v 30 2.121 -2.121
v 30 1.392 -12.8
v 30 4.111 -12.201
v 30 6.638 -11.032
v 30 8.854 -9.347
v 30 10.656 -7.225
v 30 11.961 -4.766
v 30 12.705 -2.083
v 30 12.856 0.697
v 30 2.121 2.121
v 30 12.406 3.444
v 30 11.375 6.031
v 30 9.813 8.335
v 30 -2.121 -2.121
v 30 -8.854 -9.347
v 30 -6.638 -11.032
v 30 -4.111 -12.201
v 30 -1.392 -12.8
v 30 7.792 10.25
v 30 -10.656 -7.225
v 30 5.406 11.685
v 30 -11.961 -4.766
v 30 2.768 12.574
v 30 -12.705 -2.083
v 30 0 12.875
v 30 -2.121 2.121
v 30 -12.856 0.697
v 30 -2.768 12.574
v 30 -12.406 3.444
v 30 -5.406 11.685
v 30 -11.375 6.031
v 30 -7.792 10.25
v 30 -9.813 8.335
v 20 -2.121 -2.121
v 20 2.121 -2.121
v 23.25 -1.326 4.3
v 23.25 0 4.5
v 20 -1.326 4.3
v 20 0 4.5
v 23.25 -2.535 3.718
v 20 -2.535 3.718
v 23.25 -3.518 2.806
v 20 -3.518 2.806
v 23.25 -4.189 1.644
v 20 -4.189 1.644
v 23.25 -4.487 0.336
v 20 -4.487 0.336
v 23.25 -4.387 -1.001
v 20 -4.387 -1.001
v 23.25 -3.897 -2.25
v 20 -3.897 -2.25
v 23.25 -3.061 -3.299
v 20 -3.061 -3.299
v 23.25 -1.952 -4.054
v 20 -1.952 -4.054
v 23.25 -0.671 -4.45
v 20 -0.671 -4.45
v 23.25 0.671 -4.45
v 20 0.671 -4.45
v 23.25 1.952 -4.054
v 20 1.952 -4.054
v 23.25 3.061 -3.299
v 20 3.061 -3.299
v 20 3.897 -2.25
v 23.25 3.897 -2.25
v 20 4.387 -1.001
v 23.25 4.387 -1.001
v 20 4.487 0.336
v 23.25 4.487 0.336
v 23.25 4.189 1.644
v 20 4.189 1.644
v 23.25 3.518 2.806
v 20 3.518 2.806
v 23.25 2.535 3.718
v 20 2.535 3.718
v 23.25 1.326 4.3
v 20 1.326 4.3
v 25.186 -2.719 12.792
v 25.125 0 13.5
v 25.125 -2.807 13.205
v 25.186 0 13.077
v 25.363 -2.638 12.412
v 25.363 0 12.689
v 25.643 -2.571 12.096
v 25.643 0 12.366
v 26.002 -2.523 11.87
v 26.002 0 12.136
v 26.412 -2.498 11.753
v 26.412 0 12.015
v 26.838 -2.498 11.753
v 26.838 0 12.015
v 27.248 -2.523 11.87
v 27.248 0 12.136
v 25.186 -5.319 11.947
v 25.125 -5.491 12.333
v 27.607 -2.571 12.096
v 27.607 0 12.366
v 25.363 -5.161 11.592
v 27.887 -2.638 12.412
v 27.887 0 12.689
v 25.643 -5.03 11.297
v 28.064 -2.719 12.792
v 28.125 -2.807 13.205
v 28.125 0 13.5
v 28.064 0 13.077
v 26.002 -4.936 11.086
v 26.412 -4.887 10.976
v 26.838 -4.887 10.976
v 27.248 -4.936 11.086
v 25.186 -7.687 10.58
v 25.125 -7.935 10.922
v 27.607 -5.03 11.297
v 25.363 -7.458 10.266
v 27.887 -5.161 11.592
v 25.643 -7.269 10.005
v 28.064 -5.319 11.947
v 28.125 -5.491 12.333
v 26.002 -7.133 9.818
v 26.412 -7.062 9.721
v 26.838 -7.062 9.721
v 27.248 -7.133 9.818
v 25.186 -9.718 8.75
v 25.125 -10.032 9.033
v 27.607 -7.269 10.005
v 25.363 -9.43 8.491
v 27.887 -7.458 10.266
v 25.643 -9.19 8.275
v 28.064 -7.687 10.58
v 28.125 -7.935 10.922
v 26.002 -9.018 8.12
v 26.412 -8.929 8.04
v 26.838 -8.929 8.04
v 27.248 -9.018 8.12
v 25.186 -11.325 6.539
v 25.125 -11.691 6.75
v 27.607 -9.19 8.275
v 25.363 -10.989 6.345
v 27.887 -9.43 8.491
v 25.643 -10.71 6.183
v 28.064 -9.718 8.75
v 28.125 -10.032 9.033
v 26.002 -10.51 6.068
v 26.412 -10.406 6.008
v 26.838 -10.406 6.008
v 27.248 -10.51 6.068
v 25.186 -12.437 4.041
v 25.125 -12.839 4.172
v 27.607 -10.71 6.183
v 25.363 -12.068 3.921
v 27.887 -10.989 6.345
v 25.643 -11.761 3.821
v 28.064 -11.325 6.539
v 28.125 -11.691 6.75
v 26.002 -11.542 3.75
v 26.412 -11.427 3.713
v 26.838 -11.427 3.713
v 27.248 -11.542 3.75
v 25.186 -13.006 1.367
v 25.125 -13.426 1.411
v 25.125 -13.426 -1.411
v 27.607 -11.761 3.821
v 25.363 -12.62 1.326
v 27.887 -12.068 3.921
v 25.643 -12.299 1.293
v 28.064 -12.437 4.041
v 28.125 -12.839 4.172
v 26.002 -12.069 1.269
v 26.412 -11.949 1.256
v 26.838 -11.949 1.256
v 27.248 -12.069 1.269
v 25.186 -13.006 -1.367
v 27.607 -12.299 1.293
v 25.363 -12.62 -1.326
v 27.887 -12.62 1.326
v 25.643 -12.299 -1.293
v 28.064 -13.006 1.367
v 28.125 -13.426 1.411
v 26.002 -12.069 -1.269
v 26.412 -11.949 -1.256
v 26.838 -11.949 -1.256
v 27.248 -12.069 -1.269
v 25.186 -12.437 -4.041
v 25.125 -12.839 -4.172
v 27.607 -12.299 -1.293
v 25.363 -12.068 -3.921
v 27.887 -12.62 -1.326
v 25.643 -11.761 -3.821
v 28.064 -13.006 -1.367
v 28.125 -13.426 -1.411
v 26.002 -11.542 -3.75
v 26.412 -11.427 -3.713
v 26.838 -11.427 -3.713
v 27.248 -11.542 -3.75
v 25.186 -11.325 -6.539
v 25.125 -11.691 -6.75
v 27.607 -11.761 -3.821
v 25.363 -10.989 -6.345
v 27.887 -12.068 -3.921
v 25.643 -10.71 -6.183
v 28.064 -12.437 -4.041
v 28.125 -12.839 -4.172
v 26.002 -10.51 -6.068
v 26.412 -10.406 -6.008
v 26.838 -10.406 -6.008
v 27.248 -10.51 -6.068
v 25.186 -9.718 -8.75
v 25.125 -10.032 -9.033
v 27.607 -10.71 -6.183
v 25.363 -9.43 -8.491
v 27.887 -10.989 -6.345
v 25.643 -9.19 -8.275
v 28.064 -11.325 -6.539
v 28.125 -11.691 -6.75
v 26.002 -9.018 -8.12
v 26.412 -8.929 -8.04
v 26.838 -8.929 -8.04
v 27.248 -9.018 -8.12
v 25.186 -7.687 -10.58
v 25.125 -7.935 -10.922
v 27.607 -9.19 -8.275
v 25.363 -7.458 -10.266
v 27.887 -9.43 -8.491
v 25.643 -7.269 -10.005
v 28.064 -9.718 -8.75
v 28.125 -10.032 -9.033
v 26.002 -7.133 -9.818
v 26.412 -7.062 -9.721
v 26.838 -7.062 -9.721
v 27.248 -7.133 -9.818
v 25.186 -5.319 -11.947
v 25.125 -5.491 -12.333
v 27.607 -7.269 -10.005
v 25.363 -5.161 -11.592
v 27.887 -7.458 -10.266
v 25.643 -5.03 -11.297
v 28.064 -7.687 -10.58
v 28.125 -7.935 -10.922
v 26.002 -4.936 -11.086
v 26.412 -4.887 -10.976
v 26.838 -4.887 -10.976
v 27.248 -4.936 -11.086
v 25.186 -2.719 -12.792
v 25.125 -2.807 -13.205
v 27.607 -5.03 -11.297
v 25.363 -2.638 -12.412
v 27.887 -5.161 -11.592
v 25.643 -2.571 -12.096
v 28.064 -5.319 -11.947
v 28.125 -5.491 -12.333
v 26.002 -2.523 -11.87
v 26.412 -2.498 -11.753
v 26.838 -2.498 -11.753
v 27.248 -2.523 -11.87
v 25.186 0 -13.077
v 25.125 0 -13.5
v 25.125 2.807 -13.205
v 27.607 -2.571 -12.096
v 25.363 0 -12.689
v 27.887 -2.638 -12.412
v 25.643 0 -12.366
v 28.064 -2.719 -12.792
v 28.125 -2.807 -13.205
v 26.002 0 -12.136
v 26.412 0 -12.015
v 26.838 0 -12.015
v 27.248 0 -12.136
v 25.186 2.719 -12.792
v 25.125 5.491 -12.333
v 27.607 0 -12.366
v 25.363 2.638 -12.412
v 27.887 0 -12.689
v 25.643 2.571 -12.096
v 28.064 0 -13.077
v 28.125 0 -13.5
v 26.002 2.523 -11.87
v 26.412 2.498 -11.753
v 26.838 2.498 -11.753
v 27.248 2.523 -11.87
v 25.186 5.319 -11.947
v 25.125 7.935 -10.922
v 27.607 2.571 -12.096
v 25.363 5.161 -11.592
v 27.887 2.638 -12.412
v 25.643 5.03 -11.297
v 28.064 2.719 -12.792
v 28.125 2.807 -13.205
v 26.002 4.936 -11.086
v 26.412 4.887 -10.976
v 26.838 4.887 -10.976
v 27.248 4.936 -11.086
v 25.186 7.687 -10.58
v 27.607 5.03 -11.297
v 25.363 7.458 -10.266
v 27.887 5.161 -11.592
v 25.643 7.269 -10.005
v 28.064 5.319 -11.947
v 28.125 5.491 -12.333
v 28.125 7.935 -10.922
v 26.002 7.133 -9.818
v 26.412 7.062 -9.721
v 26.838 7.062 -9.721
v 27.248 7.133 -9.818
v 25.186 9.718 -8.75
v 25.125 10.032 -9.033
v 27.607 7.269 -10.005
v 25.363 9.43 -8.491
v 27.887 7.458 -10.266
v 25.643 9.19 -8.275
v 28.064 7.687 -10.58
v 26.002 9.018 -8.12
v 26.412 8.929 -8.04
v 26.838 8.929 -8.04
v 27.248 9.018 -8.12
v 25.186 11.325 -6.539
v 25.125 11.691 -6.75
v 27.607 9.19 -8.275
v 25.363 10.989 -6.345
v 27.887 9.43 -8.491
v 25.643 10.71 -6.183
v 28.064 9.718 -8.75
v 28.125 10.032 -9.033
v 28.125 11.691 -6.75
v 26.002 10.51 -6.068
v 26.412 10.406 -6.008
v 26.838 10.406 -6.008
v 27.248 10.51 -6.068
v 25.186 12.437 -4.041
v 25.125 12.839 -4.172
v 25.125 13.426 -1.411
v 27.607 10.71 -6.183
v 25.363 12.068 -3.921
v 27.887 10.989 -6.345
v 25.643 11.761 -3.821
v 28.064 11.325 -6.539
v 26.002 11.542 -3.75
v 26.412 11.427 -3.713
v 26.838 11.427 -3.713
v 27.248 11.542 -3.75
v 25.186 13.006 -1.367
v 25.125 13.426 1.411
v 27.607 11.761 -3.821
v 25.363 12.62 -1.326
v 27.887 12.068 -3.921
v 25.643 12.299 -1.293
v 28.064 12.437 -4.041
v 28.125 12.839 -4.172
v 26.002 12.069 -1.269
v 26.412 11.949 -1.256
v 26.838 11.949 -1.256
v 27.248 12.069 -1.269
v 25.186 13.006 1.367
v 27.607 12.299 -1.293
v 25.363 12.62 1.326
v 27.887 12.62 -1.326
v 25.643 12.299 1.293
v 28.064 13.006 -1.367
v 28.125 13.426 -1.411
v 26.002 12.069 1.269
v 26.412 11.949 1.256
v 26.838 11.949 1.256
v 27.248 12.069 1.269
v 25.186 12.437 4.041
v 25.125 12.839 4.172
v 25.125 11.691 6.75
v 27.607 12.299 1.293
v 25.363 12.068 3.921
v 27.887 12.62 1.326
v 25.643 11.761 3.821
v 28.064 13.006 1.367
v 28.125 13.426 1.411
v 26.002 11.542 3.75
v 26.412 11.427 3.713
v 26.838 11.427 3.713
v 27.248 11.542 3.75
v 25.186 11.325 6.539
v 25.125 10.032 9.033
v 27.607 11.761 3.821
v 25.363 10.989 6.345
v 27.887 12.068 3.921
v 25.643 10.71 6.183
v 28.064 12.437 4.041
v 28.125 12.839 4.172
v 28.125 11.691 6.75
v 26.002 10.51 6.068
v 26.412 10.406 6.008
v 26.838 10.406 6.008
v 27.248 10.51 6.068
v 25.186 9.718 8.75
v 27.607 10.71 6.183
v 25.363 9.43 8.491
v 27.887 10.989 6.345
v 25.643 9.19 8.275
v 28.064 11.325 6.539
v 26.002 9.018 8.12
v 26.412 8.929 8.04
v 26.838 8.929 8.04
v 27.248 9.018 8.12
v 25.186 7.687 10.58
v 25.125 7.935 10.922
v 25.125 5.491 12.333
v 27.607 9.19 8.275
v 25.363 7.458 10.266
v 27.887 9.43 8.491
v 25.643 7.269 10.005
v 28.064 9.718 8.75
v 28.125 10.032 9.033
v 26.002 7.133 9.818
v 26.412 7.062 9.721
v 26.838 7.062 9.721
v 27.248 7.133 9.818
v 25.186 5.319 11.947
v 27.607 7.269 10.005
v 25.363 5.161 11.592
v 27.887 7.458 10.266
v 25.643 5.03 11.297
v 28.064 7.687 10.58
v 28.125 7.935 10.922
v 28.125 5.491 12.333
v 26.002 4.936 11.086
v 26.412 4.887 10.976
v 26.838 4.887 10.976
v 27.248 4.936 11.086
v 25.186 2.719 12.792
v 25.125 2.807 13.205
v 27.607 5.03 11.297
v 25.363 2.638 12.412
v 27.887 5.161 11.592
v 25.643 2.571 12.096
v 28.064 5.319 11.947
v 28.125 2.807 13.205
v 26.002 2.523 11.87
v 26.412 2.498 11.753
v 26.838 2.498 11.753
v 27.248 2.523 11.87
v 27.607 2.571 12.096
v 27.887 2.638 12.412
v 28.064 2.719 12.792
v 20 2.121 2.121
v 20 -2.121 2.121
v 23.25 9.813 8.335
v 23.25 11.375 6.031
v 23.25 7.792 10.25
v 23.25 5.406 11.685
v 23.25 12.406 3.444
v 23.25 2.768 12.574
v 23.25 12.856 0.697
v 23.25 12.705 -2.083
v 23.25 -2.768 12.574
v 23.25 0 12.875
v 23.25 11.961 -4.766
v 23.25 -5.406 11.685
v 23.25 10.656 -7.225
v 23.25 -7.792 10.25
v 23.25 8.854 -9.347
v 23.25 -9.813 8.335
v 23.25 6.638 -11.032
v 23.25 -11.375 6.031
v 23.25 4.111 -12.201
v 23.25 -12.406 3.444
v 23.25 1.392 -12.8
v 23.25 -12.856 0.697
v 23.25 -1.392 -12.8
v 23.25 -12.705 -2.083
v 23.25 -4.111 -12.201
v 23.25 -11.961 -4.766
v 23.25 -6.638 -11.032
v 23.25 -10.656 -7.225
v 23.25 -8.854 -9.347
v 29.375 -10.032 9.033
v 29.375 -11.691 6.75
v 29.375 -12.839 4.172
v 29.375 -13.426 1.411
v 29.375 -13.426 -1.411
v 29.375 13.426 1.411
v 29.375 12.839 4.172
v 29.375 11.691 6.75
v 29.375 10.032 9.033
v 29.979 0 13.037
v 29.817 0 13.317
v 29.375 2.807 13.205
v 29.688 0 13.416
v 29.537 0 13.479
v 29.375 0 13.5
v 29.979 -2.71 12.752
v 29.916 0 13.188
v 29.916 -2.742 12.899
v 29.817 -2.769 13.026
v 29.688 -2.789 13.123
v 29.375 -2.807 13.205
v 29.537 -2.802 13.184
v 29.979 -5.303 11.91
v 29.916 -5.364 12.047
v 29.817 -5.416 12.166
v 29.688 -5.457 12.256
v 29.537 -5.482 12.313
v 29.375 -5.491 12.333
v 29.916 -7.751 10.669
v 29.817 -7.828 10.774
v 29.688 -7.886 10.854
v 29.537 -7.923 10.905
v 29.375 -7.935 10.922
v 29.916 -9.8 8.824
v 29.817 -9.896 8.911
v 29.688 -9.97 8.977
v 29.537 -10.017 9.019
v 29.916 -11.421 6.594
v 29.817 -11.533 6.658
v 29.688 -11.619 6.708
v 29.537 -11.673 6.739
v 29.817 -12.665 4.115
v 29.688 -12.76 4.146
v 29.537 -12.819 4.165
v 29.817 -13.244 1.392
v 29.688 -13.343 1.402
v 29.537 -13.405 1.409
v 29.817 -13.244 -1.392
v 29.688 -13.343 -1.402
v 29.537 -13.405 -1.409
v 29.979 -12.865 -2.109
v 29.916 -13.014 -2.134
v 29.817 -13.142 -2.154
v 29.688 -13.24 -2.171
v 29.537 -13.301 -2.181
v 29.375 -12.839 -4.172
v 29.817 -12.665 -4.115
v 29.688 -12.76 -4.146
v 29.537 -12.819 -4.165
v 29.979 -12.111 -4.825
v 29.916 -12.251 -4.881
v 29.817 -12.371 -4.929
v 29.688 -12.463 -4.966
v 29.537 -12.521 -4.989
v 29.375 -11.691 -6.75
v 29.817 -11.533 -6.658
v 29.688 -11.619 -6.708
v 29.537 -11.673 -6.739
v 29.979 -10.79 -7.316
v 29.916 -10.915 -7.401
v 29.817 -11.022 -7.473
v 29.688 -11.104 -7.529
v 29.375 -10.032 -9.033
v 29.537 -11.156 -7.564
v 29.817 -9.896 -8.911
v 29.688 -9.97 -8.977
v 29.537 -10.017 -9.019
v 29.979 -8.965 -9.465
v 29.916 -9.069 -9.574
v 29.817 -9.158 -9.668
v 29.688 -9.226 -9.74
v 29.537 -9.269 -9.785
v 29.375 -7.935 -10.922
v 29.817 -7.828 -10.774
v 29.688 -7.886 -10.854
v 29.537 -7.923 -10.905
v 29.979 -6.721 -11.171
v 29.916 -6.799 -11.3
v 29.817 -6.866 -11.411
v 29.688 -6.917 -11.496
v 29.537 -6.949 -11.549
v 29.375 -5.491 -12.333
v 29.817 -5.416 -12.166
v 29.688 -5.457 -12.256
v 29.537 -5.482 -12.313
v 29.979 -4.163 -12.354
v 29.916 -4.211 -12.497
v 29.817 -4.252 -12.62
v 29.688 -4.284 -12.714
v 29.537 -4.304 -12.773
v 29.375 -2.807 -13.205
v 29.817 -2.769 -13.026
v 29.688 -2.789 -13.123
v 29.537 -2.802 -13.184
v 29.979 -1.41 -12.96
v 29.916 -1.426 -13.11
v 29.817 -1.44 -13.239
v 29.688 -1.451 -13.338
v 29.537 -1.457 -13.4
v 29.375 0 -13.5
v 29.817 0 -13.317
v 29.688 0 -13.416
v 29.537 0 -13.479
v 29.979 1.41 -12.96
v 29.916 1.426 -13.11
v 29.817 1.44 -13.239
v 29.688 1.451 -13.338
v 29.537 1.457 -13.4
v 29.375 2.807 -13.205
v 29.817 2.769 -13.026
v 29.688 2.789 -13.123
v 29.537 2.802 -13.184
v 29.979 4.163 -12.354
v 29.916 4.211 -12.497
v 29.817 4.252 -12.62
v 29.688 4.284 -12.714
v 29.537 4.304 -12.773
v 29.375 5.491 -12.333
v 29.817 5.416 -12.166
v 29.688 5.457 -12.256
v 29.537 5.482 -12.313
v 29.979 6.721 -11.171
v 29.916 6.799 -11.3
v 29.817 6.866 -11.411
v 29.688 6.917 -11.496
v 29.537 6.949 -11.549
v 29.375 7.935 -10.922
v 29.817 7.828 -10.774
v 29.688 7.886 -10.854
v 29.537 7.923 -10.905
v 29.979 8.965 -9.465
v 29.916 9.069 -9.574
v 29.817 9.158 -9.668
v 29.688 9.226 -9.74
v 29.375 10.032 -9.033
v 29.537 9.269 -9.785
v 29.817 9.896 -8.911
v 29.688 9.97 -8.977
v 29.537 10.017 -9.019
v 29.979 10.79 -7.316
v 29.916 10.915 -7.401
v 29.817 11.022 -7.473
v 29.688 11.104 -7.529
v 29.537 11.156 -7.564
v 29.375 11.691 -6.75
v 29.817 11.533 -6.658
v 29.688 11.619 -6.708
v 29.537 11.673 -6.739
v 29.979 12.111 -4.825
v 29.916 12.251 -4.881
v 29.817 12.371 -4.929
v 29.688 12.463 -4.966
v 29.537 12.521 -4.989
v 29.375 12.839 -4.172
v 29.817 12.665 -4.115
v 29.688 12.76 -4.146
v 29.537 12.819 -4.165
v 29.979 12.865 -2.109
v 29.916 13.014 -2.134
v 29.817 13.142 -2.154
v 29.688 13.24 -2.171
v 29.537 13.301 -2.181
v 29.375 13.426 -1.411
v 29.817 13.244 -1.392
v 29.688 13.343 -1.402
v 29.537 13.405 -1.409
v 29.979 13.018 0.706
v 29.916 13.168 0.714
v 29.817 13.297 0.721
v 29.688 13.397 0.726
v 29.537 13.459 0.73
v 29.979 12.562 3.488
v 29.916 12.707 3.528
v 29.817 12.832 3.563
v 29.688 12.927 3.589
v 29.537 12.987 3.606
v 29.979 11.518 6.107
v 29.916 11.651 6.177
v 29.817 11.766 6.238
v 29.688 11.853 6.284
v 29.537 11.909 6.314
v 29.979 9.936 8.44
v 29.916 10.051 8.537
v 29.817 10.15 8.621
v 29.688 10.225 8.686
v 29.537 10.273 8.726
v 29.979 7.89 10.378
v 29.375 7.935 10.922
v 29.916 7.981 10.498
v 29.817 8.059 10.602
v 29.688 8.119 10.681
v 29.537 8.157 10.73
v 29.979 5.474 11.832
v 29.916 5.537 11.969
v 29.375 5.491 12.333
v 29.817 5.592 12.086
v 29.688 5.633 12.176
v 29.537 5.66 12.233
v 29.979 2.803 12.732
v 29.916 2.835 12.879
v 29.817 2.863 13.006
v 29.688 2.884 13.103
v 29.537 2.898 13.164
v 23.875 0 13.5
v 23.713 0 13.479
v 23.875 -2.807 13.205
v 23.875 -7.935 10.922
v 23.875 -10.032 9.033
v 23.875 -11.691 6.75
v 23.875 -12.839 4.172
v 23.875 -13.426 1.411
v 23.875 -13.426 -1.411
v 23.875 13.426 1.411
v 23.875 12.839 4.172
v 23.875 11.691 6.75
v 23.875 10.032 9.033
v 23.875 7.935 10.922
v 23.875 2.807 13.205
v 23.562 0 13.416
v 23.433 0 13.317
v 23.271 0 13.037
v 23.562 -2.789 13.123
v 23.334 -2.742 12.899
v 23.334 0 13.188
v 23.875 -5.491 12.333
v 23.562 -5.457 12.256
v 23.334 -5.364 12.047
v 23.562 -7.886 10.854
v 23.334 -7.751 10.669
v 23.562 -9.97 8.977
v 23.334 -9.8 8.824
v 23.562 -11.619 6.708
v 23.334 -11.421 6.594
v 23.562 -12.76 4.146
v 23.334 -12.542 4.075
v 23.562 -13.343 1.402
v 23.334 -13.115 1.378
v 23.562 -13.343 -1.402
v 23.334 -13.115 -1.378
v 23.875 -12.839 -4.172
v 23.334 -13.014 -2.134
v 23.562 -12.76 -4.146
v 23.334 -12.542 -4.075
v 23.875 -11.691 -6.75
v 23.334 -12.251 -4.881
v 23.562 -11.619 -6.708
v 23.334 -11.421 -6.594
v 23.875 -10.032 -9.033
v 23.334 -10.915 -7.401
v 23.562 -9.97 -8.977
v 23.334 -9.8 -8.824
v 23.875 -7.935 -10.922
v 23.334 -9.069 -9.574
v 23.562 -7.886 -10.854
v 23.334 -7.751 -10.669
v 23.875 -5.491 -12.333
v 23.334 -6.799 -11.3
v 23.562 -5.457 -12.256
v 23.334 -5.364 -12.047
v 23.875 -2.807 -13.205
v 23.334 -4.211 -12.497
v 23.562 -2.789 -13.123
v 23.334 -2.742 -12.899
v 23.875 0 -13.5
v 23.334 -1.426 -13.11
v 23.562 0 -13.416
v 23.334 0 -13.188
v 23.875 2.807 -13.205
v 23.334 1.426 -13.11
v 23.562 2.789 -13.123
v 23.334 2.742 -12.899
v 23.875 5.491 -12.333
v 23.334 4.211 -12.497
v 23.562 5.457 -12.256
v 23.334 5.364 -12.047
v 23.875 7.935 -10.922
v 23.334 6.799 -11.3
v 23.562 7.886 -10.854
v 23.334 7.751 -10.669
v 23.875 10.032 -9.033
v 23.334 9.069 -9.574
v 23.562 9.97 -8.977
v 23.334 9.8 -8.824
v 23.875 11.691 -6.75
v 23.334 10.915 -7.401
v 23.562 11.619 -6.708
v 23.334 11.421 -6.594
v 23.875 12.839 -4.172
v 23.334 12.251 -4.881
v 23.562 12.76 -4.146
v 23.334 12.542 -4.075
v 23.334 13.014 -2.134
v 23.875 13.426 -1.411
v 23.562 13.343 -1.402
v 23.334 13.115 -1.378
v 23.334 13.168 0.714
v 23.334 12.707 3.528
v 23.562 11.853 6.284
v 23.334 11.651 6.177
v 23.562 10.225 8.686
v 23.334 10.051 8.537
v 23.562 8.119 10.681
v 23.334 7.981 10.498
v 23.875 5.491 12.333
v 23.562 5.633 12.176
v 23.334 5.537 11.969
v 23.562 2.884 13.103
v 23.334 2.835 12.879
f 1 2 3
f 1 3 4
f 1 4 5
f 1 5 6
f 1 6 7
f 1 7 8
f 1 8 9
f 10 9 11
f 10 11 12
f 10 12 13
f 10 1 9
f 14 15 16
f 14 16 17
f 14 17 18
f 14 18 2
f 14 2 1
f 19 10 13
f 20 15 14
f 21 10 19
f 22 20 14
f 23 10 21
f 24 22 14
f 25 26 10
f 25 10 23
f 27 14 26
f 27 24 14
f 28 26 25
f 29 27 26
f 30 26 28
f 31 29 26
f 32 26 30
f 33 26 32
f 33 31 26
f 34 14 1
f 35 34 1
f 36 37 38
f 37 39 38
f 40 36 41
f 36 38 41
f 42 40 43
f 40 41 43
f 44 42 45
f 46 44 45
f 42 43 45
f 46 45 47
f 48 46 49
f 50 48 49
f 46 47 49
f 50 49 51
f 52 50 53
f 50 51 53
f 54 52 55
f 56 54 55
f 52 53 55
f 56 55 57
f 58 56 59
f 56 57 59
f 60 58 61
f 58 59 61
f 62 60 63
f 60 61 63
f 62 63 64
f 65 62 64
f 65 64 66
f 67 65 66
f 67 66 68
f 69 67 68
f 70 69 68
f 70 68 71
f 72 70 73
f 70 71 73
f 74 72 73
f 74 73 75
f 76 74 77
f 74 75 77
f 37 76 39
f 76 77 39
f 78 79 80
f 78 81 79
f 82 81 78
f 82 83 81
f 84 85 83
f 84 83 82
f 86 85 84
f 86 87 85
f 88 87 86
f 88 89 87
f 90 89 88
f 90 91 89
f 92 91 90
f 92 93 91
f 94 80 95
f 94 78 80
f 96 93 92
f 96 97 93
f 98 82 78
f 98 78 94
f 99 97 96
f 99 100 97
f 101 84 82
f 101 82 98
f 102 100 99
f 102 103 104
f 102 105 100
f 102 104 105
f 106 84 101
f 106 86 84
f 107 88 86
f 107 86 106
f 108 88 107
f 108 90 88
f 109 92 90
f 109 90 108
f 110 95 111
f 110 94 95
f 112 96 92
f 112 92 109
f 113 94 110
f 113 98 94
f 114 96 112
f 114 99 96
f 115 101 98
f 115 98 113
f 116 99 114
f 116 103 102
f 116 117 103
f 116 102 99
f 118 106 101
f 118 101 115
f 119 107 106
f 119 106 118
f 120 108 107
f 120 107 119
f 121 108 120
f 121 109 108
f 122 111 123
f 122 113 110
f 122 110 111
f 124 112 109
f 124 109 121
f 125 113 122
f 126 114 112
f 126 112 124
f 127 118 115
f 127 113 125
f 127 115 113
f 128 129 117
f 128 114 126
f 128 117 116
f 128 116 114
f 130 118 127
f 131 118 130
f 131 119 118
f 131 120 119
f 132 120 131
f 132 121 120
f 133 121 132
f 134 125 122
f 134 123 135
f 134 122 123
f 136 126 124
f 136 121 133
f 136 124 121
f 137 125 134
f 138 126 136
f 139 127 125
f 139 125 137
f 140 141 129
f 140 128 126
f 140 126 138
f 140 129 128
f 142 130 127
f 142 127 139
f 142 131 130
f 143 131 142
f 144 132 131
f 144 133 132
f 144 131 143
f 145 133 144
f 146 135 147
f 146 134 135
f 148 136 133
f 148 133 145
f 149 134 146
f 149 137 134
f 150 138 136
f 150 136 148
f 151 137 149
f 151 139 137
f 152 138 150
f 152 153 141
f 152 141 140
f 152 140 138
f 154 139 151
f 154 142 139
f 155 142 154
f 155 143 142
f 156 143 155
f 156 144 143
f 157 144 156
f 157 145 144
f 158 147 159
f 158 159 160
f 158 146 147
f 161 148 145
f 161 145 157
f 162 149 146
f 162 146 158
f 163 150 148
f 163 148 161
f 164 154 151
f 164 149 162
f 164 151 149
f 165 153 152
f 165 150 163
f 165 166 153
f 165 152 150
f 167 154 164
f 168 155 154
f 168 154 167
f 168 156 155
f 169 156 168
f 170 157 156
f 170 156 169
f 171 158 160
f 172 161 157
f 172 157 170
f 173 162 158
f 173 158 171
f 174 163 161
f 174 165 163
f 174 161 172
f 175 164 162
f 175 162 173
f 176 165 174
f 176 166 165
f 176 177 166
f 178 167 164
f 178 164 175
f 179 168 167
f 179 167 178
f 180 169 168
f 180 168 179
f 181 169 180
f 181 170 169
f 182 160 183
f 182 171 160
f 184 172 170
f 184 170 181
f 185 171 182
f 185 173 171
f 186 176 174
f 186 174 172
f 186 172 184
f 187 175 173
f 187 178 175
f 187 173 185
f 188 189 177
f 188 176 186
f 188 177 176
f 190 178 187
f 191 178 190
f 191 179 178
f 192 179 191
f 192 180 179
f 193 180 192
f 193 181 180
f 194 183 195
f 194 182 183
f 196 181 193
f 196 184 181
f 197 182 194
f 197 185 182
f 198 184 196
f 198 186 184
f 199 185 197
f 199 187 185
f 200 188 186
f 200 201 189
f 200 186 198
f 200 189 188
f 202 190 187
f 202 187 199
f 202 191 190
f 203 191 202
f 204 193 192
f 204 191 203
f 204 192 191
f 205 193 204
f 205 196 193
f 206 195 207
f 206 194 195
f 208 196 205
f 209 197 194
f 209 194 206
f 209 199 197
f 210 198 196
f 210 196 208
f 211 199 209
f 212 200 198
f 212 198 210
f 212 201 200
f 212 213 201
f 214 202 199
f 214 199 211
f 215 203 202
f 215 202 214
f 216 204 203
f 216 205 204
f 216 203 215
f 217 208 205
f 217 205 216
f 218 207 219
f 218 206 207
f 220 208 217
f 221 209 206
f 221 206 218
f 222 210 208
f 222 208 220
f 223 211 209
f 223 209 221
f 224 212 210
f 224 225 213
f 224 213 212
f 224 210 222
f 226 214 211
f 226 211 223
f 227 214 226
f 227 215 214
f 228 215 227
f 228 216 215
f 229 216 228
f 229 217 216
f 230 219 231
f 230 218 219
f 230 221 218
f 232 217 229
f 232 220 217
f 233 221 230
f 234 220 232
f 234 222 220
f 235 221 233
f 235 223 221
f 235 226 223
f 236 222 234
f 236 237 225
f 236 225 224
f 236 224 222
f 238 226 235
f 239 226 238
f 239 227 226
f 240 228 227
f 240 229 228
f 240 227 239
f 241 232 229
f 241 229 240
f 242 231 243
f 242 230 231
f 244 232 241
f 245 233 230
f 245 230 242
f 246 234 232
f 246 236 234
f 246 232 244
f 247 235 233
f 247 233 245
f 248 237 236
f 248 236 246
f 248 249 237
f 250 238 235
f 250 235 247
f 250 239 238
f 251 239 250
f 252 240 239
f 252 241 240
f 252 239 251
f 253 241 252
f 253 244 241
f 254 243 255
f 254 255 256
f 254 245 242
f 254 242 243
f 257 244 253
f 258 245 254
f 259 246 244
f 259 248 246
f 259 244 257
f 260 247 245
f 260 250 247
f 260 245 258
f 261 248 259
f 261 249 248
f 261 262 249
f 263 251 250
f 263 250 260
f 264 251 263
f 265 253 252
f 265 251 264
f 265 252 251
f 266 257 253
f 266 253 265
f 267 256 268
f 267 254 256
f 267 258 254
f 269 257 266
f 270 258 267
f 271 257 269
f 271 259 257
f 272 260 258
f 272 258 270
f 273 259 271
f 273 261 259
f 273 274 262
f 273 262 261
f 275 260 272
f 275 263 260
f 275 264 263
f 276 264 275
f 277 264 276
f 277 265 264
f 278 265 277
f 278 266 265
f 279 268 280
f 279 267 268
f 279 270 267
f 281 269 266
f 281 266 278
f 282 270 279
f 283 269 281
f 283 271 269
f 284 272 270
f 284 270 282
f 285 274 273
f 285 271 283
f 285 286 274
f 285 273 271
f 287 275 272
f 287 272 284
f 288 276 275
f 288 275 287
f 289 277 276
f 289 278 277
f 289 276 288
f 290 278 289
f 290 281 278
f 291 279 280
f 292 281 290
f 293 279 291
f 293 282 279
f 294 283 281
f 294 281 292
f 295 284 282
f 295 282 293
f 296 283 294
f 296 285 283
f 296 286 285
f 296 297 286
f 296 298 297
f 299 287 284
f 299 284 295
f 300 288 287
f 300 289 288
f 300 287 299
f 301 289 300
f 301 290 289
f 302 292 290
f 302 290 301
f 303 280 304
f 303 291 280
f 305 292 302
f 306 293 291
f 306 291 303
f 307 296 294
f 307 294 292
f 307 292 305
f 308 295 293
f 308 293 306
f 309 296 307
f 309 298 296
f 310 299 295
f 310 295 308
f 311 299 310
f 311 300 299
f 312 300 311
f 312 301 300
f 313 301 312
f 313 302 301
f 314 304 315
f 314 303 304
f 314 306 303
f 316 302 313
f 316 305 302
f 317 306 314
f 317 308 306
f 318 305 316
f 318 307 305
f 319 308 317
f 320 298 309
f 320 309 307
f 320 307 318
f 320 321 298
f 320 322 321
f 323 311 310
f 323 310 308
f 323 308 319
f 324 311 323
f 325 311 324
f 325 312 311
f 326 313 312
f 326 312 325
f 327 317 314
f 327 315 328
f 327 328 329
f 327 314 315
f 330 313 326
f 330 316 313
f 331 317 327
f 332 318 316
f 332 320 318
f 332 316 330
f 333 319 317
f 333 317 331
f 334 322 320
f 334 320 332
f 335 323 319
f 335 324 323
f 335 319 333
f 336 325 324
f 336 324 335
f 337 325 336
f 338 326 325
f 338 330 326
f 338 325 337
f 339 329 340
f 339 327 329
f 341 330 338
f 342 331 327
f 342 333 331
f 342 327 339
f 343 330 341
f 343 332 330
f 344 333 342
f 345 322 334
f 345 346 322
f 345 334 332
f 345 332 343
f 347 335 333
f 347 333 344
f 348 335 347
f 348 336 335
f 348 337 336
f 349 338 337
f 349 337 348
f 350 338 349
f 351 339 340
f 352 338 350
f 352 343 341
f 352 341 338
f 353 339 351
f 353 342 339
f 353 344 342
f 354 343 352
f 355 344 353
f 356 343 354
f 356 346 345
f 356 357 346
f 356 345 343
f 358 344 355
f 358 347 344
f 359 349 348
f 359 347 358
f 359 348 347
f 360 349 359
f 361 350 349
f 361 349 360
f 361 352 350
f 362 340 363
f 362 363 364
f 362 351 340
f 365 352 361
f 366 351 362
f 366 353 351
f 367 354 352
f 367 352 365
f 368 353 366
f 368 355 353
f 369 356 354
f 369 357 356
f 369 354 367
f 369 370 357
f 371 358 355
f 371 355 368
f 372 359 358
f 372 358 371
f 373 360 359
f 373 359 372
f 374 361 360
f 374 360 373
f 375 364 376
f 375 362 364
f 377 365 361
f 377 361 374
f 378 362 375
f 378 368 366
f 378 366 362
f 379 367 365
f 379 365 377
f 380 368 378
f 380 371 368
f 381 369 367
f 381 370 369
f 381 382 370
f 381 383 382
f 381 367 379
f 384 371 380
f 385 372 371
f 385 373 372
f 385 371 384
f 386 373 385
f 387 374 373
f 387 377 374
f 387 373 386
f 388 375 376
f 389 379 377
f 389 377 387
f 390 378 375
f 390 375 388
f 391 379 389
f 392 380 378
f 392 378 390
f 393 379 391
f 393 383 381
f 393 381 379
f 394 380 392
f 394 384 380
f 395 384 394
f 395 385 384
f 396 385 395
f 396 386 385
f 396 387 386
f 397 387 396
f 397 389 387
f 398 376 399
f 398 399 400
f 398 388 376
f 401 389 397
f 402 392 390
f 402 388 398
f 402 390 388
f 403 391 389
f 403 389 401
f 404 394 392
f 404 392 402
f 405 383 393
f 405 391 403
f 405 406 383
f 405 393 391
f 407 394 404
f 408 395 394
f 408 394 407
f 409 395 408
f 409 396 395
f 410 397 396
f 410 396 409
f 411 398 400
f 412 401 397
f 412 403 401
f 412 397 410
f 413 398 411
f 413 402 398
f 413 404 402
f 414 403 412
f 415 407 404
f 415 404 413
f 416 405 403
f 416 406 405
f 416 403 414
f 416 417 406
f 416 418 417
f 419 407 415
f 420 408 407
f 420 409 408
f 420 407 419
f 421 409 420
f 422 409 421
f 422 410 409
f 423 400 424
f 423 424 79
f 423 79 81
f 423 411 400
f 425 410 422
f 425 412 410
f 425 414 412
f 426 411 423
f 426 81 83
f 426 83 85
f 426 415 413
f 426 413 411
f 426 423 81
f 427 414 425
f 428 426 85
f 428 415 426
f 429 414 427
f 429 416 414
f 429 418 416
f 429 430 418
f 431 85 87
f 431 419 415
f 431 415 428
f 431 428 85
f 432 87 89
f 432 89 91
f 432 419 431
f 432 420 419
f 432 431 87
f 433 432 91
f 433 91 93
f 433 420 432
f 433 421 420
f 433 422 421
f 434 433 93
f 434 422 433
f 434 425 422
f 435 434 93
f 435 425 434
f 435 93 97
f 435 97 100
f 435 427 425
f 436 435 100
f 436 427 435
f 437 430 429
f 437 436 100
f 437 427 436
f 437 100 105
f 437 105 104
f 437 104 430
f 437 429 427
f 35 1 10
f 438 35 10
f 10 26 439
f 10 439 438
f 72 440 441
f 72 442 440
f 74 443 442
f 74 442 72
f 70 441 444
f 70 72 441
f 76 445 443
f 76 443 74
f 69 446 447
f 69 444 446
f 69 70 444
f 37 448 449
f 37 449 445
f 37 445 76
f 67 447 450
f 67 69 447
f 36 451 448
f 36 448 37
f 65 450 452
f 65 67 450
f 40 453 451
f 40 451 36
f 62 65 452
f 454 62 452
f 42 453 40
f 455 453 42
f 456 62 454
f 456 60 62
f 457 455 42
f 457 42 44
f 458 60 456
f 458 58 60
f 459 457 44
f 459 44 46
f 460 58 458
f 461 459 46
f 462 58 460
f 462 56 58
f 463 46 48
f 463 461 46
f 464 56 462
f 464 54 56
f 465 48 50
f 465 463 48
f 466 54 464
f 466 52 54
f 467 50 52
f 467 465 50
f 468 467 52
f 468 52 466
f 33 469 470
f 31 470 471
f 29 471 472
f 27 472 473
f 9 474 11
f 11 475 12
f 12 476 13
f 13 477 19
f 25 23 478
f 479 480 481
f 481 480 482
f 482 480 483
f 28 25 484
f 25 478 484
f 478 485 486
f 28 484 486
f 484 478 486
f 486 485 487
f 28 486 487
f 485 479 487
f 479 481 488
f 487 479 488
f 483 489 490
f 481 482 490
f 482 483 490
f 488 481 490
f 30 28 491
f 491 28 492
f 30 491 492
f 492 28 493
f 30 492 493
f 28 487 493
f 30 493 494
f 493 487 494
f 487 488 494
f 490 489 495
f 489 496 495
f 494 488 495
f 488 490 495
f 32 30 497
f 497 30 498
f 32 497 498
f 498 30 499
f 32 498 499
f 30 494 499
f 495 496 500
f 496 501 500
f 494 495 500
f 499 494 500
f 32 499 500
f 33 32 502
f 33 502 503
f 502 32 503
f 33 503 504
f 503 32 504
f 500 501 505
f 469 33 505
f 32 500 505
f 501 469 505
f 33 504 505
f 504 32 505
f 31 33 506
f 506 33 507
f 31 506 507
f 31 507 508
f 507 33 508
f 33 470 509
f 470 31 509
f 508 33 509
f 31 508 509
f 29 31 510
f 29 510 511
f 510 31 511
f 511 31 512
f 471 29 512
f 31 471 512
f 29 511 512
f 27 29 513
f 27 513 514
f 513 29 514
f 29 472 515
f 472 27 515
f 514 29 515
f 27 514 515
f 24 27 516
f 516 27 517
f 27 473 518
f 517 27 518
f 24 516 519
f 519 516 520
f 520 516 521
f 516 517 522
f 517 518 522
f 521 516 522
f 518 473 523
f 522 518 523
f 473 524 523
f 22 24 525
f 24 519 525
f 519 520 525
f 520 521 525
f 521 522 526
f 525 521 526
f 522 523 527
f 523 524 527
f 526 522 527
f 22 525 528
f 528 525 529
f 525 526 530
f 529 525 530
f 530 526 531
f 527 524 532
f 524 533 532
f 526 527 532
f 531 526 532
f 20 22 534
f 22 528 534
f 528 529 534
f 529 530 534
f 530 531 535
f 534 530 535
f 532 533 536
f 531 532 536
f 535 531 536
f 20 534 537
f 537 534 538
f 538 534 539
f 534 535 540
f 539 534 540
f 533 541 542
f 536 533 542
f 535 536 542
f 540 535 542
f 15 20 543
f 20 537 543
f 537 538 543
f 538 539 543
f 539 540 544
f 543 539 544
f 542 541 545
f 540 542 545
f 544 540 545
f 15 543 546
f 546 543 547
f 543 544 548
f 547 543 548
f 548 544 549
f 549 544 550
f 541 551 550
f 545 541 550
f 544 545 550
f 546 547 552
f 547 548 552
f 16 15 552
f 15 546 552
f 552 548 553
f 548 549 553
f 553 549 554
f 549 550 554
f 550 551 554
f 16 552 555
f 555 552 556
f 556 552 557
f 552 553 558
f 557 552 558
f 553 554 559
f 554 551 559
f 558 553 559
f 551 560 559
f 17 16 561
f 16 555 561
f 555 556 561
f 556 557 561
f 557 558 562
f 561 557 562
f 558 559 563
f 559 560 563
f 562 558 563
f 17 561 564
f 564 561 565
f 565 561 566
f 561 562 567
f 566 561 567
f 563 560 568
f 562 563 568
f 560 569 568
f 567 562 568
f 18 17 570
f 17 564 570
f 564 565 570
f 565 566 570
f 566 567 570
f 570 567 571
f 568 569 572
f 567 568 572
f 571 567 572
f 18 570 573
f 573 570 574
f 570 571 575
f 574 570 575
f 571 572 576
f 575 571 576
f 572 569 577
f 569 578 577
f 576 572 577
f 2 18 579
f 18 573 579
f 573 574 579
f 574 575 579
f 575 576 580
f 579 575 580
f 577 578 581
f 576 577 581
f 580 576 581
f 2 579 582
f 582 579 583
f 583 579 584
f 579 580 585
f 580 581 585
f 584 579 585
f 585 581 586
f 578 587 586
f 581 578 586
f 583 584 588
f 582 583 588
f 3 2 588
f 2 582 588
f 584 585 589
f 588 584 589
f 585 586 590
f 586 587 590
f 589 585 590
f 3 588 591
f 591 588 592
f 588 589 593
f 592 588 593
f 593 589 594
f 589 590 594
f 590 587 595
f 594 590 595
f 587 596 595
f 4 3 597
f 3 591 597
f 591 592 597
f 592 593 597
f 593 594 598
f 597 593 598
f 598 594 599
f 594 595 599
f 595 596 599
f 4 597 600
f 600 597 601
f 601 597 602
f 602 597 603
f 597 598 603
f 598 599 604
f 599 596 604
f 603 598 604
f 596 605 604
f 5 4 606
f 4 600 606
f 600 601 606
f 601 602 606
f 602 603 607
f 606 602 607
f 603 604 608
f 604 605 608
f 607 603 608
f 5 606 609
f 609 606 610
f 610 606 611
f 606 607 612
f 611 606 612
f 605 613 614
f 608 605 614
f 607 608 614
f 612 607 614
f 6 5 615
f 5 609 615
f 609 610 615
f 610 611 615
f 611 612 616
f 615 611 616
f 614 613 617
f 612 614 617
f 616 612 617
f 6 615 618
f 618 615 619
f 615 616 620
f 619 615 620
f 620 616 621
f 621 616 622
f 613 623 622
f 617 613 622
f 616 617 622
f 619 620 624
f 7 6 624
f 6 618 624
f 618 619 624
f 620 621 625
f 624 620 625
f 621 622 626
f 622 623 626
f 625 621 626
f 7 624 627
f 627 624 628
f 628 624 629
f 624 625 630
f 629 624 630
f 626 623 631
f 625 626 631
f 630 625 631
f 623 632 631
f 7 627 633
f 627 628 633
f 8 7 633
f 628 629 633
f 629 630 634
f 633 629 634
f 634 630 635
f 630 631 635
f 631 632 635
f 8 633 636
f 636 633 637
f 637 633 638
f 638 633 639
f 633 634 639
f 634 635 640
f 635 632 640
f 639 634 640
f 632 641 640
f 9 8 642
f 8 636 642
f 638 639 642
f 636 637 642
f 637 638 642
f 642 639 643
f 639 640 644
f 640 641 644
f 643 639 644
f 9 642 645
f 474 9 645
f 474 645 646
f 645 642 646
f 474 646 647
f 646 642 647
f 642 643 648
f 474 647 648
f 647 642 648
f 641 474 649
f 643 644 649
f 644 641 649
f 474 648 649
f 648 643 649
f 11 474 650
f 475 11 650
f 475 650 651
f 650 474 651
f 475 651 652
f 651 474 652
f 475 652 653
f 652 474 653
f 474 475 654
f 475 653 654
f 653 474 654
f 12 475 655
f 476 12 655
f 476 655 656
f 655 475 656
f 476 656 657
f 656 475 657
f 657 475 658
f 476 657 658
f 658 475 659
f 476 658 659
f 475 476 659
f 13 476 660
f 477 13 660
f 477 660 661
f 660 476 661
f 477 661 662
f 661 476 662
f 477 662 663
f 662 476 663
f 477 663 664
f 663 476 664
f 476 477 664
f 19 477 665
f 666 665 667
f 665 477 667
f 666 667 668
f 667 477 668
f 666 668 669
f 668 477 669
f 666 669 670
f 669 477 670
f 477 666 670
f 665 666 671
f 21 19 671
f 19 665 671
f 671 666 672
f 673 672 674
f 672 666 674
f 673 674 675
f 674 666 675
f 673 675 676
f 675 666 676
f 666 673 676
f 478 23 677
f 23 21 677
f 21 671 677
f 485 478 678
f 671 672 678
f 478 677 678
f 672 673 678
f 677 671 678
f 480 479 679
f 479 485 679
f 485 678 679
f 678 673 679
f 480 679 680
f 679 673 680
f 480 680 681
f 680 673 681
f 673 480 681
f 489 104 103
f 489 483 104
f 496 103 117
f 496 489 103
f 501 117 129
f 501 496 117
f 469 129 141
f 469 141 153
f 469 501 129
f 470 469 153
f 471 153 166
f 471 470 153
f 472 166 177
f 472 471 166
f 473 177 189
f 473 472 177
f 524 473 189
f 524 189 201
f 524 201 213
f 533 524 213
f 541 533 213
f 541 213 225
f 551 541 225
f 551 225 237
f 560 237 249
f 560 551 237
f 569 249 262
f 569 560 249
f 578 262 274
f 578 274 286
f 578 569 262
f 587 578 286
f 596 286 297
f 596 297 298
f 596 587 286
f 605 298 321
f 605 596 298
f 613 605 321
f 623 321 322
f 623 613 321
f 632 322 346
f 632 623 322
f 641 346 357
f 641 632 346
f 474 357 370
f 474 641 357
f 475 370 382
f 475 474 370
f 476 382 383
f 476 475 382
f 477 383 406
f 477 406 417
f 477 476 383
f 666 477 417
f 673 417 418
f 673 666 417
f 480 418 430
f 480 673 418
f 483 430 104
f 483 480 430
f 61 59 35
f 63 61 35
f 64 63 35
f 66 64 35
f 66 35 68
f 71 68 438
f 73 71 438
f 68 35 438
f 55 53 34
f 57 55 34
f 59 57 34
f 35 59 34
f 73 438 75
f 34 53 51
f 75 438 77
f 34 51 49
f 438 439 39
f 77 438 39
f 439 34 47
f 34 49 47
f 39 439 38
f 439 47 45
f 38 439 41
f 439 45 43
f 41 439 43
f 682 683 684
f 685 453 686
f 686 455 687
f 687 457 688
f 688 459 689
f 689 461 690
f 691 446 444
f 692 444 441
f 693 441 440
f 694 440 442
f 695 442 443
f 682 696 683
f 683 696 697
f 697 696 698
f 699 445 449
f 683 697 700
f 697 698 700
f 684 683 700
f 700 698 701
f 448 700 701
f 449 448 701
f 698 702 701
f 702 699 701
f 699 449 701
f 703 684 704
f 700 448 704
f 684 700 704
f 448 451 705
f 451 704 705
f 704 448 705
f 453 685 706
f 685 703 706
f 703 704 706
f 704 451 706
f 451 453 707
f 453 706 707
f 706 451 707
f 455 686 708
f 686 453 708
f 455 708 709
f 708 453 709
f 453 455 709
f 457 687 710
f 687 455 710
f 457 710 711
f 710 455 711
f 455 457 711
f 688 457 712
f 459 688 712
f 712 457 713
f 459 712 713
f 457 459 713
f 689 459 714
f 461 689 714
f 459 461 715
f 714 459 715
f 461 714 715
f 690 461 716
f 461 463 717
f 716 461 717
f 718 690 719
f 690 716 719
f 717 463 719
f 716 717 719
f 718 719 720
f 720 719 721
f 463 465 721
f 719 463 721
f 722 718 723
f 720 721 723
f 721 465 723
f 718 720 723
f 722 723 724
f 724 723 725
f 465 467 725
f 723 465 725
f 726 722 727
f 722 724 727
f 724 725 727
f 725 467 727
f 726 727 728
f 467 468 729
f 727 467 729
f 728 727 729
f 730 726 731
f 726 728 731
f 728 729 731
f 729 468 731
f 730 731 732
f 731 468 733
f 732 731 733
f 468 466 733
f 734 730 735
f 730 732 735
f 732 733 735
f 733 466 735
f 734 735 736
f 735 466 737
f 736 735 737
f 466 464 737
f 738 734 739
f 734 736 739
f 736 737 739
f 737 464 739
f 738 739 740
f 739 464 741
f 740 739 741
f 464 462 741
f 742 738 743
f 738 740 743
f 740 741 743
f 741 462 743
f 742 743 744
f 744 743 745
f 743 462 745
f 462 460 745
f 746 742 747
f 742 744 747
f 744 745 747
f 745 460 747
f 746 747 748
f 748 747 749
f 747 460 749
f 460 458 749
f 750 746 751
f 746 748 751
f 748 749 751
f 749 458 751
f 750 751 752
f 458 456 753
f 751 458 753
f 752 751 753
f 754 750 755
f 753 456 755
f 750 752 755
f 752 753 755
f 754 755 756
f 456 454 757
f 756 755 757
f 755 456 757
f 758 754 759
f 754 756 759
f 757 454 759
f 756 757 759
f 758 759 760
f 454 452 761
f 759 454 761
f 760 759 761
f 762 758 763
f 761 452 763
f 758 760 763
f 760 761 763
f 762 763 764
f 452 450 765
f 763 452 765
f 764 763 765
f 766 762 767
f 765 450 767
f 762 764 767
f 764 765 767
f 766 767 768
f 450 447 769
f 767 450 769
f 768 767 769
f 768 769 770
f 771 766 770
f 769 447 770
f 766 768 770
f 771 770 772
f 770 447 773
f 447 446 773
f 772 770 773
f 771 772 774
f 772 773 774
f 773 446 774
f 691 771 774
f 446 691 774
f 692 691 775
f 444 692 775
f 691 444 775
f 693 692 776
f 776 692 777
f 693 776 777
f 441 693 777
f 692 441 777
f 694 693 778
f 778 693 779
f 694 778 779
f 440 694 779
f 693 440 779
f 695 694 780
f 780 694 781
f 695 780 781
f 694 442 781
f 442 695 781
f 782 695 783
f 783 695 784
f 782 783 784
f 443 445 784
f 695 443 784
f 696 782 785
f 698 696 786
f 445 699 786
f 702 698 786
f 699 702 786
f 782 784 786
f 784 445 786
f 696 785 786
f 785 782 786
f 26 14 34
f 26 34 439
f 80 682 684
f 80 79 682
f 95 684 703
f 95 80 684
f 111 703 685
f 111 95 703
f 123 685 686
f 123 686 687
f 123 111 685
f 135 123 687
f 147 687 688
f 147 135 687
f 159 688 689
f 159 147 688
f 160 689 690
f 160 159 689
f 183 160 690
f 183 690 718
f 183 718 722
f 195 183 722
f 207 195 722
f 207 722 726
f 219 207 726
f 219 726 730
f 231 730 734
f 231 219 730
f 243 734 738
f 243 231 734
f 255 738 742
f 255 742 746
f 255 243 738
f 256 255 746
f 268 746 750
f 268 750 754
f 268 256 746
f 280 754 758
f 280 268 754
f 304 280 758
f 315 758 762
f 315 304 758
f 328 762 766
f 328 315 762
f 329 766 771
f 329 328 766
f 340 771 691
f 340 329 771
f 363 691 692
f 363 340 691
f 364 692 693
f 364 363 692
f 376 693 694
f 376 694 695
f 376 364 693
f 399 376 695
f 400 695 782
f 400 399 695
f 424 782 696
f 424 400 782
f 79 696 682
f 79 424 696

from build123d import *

# Parameters (mm, degrees)
SKETCH009_W      = 4.24264
SKETCH009_H      = 4.24264
EXTRUDE004_DEPTH = 10


with BuildPart() as extrude004:
    # Sketch009 (on Face5 of Revolve001) → Extrude004 (new body)
    with BuildSketch(Plane.YZ.offset(30)):
        Rectangle(SKETCH009_W, SKETCH009_H)
    extrude(amount=-EXTRUDE004_DEPTH)


with BuildPart() as driven_wheel:
    # Sketch007 → Revolve001 (revolve)
    with BuildSketch(Plane.XZ):
        with BuildLine():
            Line((20, 4.5), (20, 0))
            Line((20, 0), (23.25, 0))
            Line((30, 0), (23.25, 0))
            Line((30, 12.875), (30, 0))
            ThreePointArc((30, 12.875), (29.816942, 13.316942), (29.375, 13.5))
            Line((28.125, 13.5), (29.375, 13.5))
            ThreePointArc((25.125, 13.5), (26.625, 12), (28.125, 13.5))
            Line((23.875, 13.5), (25.125, 13.5))
            ThreePointArc((23.875, 13.5), (23.433058, 13.316942), (23.25, 12.875))
            Line((23.25, 4.5), (23.25, 12.875))
            Line((23.25, 4.5), (20, 4.5))
        make_face()
    revolve(axis=Axis((0, 0, 0), (1, 0, 0)))

    # Cut: cut Extrude004
    add(extrude004.part, mode=Mode.SUBTRACT)


solid = driven_wheel.part
